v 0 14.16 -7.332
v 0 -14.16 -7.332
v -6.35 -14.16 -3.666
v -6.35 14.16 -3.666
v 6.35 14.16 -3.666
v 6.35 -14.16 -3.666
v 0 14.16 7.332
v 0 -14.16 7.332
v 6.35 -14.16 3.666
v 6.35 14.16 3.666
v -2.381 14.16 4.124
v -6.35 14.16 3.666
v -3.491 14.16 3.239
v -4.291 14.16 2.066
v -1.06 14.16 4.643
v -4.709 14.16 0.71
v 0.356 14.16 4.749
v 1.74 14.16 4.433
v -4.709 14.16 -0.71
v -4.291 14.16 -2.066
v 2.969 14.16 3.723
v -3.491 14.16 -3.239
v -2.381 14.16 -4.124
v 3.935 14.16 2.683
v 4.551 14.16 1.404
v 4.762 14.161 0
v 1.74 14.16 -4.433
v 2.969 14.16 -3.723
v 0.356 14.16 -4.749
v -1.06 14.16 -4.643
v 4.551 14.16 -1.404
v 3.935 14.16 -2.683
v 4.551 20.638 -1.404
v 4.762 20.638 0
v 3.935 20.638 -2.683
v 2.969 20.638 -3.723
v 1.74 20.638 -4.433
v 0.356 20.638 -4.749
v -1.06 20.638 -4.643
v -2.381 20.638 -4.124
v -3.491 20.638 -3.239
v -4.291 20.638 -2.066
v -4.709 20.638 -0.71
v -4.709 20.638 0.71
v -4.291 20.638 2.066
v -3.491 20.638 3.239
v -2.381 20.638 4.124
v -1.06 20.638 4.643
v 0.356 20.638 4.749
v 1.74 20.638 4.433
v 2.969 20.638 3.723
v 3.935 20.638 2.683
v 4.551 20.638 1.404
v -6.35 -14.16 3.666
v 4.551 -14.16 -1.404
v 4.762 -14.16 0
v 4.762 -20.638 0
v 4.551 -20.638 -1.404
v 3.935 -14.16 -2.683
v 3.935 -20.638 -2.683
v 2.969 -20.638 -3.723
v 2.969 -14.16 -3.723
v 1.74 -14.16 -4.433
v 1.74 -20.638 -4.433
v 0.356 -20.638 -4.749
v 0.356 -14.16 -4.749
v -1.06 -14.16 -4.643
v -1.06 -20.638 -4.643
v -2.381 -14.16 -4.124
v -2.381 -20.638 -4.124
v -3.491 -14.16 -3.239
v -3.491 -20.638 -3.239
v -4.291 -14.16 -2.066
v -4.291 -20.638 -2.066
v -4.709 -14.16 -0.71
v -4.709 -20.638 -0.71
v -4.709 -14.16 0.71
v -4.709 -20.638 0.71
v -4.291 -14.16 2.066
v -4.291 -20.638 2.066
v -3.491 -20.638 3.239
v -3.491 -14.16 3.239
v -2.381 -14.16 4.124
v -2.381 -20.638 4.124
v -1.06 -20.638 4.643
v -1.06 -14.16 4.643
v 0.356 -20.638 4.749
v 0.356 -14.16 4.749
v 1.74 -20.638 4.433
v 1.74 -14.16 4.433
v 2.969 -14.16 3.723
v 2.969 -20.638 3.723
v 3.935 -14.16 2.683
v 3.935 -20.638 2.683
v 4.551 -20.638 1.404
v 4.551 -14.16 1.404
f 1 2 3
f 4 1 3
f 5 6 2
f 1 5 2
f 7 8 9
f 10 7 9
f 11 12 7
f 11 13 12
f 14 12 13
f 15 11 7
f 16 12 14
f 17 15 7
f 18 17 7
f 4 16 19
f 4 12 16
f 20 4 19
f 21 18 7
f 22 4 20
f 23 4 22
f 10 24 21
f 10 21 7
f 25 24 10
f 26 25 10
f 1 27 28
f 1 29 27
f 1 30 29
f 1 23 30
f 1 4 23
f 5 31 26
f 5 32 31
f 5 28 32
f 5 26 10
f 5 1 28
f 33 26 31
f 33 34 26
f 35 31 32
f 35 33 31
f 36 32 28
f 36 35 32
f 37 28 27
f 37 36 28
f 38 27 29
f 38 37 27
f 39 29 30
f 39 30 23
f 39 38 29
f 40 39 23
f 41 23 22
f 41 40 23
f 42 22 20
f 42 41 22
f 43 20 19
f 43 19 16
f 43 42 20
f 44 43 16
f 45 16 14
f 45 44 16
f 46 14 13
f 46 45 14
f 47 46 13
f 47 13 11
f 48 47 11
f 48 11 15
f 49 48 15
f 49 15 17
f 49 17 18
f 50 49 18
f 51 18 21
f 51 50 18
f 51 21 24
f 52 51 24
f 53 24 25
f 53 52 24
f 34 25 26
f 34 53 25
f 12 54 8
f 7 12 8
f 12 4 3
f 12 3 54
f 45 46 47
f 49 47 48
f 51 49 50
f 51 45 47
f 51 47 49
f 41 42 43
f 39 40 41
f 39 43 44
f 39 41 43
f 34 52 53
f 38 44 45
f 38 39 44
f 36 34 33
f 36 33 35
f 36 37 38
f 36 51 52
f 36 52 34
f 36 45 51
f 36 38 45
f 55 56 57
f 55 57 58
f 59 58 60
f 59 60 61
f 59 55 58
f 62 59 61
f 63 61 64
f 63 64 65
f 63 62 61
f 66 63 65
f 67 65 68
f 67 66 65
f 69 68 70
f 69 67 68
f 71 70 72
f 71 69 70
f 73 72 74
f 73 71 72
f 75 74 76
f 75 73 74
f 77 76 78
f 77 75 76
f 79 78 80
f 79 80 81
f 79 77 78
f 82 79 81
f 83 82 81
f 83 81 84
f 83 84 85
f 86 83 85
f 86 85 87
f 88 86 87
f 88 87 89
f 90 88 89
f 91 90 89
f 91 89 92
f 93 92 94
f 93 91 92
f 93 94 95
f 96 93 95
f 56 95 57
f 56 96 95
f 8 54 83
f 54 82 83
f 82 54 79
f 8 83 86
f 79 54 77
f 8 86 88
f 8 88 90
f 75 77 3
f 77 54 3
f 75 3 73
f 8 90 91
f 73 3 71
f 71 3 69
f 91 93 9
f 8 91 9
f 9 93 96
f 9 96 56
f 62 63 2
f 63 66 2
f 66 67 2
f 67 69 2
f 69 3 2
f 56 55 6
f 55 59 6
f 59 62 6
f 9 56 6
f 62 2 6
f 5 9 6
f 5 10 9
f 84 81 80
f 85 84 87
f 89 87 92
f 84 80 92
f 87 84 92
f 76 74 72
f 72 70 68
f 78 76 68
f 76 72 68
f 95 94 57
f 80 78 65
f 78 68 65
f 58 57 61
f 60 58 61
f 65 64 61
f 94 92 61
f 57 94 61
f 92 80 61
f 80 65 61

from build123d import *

# Parameters (mm, degrees)
BOSS_EXTRUDE1_DEPTH = 14.1605
SKETCH2_R           = 4.7625
BOSS_EXTRUDE2_DEPTH = 20.6375


with BuildPart() as part:
    # Sketch1 → Boss-Extrude1 (new body, symmetric)
    with BuildSketch(Plane(origin=(0, 0, 0), x_dir=(1, 0, 0), z_dir=(0, 1, 0))):
        Polygon((6.35, -3.666174209), (6.35, 3.666174209), (0, 7.332348419), (-6.35, 3.666174209), (-6.35, -3.666174209), (0, -7.332348419), align=None)
    extrude(amount=BOSS_EXTRUDE1_DEPTH, both=True)

    # Sketch2 → Boss-Extrude2 (add, symmetric)
    with BuildSketch(Plane(origin=(0, 0, 0), x_dir=(1, 0, 0), z_dir=(0, 1, 0))):
        Circle(SKETCH2_R)
    extrude(amount=BOSS_EXTRUDE2_DEPTH, both=True)


solid = part.part
